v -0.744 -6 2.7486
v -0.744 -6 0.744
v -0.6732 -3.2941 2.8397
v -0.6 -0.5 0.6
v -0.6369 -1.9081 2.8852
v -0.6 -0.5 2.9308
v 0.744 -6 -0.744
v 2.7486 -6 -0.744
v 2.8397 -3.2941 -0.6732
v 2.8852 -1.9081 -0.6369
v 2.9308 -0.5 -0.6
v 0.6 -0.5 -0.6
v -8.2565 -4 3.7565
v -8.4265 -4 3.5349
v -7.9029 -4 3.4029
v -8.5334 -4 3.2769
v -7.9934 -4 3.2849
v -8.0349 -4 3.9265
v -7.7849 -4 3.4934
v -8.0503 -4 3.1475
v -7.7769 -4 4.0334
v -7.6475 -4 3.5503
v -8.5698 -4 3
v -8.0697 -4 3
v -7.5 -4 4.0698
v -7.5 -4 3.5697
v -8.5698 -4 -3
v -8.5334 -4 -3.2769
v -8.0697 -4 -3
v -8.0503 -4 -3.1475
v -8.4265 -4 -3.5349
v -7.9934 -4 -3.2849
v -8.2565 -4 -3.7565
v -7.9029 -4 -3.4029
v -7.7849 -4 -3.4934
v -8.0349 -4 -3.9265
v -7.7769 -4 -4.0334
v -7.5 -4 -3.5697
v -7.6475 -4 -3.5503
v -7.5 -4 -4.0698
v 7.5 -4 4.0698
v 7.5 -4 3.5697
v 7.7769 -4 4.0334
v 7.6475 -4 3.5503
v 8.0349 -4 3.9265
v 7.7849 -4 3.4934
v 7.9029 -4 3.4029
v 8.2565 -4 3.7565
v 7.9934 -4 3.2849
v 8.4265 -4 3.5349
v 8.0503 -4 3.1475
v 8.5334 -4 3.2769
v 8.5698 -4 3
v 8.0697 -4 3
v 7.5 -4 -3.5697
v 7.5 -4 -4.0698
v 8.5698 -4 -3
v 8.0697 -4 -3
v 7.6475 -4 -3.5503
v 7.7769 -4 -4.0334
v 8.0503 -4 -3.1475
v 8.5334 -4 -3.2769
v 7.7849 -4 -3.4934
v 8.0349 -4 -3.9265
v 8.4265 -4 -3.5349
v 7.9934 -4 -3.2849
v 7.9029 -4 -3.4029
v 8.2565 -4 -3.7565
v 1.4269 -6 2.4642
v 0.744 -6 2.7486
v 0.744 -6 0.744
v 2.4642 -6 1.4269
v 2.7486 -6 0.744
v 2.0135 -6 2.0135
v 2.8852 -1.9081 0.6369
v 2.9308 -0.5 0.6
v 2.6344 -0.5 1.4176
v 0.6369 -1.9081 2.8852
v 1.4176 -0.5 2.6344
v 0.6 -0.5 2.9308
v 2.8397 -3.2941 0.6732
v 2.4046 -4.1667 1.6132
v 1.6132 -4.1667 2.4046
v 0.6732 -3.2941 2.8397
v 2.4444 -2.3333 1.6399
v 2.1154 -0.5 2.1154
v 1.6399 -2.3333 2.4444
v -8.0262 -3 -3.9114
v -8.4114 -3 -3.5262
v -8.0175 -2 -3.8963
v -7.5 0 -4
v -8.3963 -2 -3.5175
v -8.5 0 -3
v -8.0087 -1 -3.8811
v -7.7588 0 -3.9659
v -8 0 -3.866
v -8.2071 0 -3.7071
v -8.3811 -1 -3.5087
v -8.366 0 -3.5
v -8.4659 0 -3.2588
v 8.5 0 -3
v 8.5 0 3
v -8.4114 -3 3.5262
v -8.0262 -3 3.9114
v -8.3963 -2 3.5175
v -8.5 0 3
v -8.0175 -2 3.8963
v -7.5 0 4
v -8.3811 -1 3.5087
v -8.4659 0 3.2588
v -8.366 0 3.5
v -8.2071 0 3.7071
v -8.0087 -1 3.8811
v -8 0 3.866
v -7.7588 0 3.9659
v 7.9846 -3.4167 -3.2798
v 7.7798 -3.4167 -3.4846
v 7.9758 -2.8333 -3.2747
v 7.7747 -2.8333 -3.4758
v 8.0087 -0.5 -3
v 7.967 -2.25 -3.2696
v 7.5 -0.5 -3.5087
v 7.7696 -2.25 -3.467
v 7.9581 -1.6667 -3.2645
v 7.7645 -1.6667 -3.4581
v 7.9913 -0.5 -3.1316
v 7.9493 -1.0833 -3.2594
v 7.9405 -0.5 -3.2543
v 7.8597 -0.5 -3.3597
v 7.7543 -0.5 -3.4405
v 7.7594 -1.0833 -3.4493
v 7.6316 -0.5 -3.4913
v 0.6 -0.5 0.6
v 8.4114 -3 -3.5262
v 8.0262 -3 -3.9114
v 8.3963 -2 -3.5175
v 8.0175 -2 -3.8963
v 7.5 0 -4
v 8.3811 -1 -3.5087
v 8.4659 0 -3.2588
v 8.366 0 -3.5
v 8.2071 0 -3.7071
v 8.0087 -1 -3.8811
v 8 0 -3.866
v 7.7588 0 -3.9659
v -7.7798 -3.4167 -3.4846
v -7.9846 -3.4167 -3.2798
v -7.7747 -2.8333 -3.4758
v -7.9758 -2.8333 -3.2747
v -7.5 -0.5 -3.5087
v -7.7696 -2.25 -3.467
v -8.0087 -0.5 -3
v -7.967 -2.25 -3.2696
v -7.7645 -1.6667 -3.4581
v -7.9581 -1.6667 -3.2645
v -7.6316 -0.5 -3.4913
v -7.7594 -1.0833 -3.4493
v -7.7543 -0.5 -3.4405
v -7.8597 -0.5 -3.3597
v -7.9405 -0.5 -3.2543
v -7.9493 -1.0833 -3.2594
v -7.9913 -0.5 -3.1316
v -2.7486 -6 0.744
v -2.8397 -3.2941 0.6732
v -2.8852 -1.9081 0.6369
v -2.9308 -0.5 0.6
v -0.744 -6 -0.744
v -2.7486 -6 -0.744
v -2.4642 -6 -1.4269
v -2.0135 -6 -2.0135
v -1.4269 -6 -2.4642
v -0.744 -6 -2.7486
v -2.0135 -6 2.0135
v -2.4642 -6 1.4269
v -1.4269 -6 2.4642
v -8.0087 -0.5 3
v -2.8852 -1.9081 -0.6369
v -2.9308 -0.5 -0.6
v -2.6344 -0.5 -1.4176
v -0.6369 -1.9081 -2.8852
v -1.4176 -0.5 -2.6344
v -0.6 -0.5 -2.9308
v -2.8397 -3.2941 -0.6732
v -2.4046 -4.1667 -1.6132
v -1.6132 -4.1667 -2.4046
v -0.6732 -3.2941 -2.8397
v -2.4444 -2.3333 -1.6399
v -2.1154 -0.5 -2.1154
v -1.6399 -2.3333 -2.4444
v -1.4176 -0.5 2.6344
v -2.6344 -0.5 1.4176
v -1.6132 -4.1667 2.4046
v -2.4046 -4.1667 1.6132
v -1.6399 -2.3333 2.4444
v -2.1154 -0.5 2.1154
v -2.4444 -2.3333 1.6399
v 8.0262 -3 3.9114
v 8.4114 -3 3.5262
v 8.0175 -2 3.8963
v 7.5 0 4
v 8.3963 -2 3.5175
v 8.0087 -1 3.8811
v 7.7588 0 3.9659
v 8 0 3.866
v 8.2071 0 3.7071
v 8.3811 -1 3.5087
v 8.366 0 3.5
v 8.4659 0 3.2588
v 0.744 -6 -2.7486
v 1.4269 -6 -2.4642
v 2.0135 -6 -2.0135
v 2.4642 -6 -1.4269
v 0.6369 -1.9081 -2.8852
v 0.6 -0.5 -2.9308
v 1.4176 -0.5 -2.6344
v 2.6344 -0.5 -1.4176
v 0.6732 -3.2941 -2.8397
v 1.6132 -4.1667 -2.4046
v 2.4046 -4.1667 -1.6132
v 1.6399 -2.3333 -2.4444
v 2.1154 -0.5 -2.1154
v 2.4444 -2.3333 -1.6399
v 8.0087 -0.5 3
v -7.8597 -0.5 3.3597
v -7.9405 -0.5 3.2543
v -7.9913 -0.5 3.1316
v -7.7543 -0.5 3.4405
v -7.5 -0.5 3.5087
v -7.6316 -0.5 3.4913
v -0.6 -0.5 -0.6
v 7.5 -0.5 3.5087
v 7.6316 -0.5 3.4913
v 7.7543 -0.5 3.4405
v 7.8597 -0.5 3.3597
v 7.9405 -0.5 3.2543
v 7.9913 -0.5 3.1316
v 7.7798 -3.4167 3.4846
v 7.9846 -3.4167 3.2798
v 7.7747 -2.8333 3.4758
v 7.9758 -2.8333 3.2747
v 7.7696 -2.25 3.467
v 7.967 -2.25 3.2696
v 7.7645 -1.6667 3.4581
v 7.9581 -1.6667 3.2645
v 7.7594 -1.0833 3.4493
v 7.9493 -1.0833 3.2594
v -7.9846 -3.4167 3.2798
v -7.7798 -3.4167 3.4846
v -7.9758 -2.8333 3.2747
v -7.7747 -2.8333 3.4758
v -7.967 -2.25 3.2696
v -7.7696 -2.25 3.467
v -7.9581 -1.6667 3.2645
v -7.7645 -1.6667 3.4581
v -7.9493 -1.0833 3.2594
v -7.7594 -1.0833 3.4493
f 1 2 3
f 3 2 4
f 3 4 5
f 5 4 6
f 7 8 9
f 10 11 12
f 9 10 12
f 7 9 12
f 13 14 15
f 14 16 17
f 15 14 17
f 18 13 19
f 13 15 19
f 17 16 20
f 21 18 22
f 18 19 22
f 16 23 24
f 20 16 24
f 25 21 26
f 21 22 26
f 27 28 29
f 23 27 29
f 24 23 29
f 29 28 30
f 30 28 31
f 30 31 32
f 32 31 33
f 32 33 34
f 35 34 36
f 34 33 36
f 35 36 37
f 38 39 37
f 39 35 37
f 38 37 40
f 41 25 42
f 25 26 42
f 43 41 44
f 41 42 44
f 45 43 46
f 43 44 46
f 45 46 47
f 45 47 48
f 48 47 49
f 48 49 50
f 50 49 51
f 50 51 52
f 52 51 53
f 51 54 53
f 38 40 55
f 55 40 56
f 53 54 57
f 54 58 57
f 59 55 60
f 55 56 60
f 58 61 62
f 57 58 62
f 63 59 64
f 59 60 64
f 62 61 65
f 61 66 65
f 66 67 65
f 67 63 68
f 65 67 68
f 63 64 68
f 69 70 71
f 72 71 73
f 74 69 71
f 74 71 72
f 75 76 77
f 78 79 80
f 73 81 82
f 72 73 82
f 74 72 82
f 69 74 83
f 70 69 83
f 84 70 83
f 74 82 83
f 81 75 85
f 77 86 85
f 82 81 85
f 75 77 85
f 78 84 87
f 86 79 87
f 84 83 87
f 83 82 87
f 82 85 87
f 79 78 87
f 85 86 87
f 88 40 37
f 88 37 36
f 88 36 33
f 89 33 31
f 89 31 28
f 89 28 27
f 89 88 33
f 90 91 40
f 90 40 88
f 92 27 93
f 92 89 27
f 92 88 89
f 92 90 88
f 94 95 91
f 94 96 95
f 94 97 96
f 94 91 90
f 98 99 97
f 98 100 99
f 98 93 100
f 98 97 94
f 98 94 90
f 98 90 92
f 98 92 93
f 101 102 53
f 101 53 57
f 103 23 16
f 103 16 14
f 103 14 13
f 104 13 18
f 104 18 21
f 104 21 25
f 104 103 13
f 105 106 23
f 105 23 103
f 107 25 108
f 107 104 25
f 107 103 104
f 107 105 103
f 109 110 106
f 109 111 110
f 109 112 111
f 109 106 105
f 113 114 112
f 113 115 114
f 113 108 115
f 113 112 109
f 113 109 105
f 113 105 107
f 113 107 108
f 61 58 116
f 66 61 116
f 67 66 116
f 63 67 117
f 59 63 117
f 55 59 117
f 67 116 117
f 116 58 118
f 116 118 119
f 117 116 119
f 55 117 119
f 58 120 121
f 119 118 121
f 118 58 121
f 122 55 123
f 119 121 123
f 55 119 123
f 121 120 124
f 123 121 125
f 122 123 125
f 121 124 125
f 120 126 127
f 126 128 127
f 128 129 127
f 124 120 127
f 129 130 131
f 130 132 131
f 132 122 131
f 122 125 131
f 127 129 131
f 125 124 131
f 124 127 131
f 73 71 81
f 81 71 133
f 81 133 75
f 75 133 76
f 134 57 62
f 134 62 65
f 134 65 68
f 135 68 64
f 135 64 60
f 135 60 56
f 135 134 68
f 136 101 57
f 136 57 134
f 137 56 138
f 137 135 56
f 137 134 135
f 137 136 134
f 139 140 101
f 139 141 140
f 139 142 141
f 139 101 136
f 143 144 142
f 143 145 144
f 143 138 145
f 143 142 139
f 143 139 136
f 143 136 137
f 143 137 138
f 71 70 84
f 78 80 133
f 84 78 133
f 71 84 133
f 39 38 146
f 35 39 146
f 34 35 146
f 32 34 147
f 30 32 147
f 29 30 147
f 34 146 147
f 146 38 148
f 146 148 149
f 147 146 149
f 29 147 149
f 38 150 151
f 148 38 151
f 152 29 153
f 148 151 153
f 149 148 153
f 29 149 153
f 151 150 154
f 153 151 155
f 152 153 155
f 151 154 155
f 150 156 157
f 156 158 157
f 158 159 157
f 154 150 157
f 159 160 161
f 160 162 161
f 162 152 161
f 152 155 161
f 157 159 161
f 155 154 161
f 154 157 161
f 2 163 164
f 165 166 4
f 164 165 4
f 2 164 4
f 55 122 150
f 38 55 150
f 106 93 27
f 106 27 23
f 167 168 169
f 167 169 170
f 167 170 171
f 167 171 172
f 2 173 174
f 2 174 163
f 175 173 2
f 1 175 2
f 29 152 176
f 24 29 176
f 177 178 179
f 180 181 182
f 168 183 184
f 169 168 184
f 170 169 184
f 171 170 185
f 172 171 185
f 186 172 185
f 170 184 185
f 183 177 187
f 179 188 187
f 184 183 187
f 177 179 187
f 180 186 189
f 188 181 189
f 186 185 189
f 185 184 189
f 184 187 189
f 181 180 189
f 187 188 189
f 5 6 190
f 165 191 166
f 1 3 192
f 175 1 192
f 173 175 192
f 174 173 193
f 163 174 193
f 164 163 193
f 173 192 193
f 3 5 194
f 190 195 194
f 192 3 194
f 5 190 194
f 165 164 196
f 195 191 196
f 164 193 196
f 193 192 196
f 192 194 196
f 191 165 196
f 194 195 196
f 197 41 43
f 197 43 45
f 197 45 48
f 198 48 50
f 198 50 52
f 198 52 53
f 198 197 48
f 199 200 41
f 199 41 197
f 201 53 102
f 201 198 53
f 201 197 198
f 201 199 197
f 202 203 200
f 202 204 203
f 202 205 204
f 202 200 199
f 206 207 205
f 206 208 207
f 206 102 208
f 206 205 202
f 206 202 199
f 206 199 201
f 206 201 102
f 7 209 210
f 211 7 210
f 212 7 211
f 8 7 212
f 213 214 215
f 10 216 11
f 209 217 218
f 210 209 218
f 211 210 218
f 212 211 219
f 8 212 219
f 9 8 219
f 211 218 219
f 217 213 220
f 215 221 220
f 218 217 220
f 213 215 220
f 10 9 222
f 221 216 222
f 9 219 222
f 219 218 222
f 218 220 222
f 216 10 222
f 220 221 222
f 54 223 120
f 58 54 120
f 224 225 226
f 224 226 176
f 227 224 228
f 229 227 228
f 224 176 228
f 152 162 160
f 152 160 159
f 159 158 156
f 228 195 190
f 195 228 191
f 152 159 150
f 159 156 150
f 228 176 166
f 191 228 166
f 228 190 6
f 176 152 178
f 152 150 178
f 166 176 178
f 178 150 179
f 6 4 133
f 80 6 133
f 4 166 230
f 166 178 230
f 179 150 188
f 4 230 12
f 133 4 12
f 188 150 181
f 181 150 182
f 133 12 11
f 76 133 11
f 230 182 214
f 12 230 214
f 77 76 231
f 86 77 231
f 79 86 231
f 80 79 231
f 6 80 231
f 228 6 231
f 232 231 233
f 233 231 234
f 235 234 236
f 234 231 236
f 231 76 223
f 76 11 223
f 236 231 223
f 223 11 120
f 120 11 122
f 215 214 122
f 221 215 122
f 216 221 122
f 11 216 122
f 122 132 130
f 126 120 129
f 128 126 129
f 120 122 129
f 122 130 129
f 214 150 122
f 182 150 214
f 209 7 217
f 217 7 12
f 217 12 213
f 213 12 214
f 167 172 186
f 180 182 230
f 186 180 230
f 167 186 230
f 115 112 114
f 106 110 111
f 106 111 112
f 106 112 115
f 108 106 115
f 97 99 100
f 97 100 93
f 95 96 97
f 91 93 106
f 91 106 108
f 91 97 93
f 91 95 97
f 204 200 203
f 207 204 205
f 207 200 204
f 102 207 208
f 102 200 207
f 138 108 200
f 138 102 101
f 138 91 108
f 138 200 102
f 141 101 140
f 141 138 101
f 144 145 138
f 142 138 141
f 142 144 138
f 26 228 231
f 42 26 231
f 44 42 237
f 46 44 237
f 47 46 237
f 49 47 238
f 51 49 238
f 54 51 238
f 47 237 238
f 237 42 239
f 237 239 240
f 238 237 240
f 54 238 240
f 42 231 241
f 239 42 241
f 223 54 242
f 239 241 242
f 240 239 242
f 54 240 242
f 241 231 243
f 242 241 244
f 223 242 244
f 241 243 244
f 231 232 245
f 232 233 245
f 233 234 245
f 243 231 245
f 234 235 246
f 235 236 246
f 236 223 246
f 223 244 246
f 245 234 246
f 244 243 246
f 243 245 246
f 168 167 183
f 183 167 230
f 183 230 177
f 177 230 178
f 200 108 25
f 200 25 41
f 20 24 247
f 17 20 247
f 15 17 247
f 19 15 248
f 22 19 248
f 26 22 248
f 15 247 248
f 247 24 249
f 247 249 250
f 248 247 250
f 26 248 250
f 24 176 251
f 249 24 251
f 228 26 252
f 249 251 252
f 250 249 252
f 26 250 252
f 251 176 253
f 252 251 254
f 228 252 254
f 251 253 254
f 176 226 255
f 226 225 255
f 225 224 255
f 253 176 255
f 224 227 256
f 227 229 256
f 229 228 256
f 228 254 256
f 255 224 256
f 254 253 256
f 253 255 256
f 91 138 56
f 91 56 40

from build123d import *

# Parameters (mm, degrees)
BOSS_EXTRUDE1_DEPTH           = 4
BOSS_EXTRUDE1_DRAFT           = 1
SHELL1_T                      = -0.5
BOSS_EXTRUDE2_DEPTH           = 5.5
BOSS_EXTRUDE2_DRAFT           = 1.5
BOSS_EXTRUDE2_PROFILE_2_DEPTH = 5.5
BOSS_EXTRUDE2_PROFILE_2_DRAFT = 1.5
BOSS_EXTRUDE2_PROFILE_3_DEPTH = 5.5
BOSS_EXTRUDE2_PROFILE_3_DRAFT = 1.5
BOSS_EXTRUDE2_PROFILE_4_DEPTH = 5.5
BOSS_EXTRUDE2_PROFILE_4_DRAFT = 1.5


with BuildPart() as part:
    # Sketch1 → Boss-Extrude1 (with draft: the straight prism first)
    with BuildSketch(Plane(origin=(0, 0, 0), x_dir=(1, 0, 0), z_dir=(0, 1, 0))):
        with BuildLine():
            Line((-7.5, -4), (7.5, -4))
            ThreePointArc((7.5, -4), (8.207106781, -3.707106781), (8.5, -3))
            Line((8.5, -3), (8.5, 3))
            ThreePointArc((8.5, 3), (8.207106781, 3.707106781), (7.5, 4))
            Line((7.5, 4), (-7.5, 4))
            ThreePointArc((-7.5, 4), (-8.207106781, 3.707106781), (-8.5, 3))
            Line((-8.5, 3), (-8.5, -3))
            ThreePointArc((-8.5, -3), (-8.207106781, -3.707106781), (-7.5, -4))
        make_face()
    extrude(amount=-BOSS_EXTRUDE1_DEPTH)
    # Boss-Extrude1: the draft: its side faces are tilted about the plane it starts from
    boss_extrude1_sides = [part.faces().sort_by_distance(p)[0] for p in [
        (0, -2, 4),
        (8.207106781, -2, 3.707106781),
        (8.5, -2, 0),
        (8.207106781, -2, -3.707106781),
        (0, -2, -4),
        (-8.207106781, -2, -3.707106781),
        (-8.5, -2, 0),
        (-8.207106781, -2, 3.707106781),
    ]]
    draft(boss_extrude1_sides, Plane(origin=(0, 0, 0), x_dir=(1, 0, 0), z_dir=(0, 1, 0)), BOSS_EXTRUDE1_DRAFT)

    # Shell1
    shell1_openings = [part.faces().sort_by_distance(p)[0] for p in [
        (0, -4, 0),
    ]]
    offset(amount=SHELL1_T, openings=shell1_openings, kind=Kind.INTERSECTION)


with BuildPart() as boss_extrude2_tool:
    # Sketch2 → Boss-Extrude2 (with draft: the straight prism first)
    with BuildSketch(Plane.XZ.offset(0.5)):
        with BuildLine():
            ThreePointArc((-0.6, 2.93078798), (-2.115362638, 2.115362638), (-2.93078798, 0.6))
            Line((-2.93078798, 0.6), (-0.6, 0.6))
            Line((-0.6, 0.6), (-0.6, 2.93078798))
        make_face()
    extrude(amount=BOSS_EXTRUDE2_DEPTH)
    # Boss-Extrude2: the draft: its side faces are tilted about the plane it starts from
    boss_extrude2_sides = [boss_extrude2_tool.faces().sort_by_distance(p)[0] for p in [
        (-2.115362638, -3.25, 2.115362638),
        (-1.76539399, -3.25, 0.6),
        (-0.6, -3.25, 1.76539399),
    ]]
    draft(boss_extrude2_sides, Plane.XZ.offset(0.5), BOSS_EXTRUDE2_DRAFT)


with BuildPart() as part_1:
    add(part.part)

    # Boss-Extrude2: add boss_extrude2_tool
    add(boss_extrude2_tool.part)


with BuildPart() as boss_extrude2_profile_2_tool:
    # Sketch2 → Boss-Extrude2 profile 2 (with draft: the straight prism first)
    with BuildSketch(Plane.XZ.offset(0.5)):
        with BuildLine():
            ThreePointArc((-2.93078798, -0.6), (-2.115362638, -2.115362638), (-0.6, -2.93078798))
            Line((-0.6, -2.93078798), (-0.6, -0.6))
            Line((-0.6, -0.6), (-2.93078798, -0.6))
        make_face()
    extrude(amount=BOSS_EXTRUDE2_PROFILE_2_DEPTH)
    # Boss-Extrude2 profile 2: the draft: its side faces are tilted about the plane it starts from
    boss_extrude2_profile_2_sides = [boss_extrude2_profile_2_tool.faces().sort_by_distance(p)[0] for p in [
        (-2.115362638, -3.25, -2.115362638),
        (-0.6, -3.25, -1.76539399),
        (-1.76539399, -3.25, -0.6),
    ]]
    draft(boss_extrude2_profile_2_sides, Plane.XZ.offset(0.5), BOSS_EXTRUDE2_PROFILE_2_DRAFT)


with BuildPart() as part_2:
    add(part_1.part)

    # Boss-Extrude2 profile 2: add boss_extrude2_profile_2_tool
    add(boss_extrude2_profile_2_tool.part)


with BuildPart() as boss_extrude2_profile_3_tool:
    # Sketch2 → Boss-Extrude2 profile 3 (with draft: the straight prism first)
    with BuildSketch(Plane.XZ.offset(0.5)):
        with BuildLine():
            Line((0.6, 2.93078798), (0.6, 0.6))
            Line((0.6, 0.6), (2.93078798, 0.6))
            ThreePointArc((2.93078798, 0.6), (2.115362638, 2.115362638), (0.6, 2.93078798))
        make_face()
    extrude(amount=BOSS_EXTRUDE2_PROFILE_3_DEPTH)
    # Boss-Extrude2 profile 3: the draft: its side faces are tilted about the plane it starts from
    boss_extrude2_profile_3_sides = [boss_extrude2_profile_3_tool.faces().sort_by_distance(p)[0] for p in [
        (2.115362638, -3.25, 2.115362638),
        (0.6, -3.25, 1.76539399),
        (1.76539399, -3.25, 0.6),
    ]]
    draft(boss_extrude2_profile_3_sides, Plane.XZ.offset(0.5), BOSS_EXTRUDE2_PROFILE_3_DRAFT)


with BuildPart() as part_3:
    add(part_2.part)

    # Boss-Extrude2 profile 3: add boss_extrude2_profile_3_tool
    add(boss_extrude2_profile_3_tool.part)


with BuildPart() as boss_extrude2_profile_4_tool:
    # Sketch2 → Boss-Extrude2 profile 4 (with draft: the straight prism first)
    with BuildSketch(Plane.XZ.offset(0.5)):
        with BuildLine():
            Line((0.6, -0.6), (0.6, -2.93078798))
            ThreePointArc((0.6, -2.93078798), (2.115362638, -2.115362638), (2.93078798, -0.6))
            Line((2.93078798, -0.6), (0.6, -0.6))
        make_face()
    extrude(amount=BOSS_EXTRUDE2_PROFILE_4_DEPTH)
    # Boss-Extrude2 profile 4: the draft: its side faces are tilted about the plane it starts from
    boss_extrude2_profile_4_sides = [boss_extrude2_profile_4_tool.faces().sort_by_distance(p)[0] for p in [
        (1.76539399, -3.25, -0.6),
        (0.6, -3.25, -1.76539399),
        (2.115362638, -3.25, -2.115362638),
    ]]
    draft(boss_extrude2_profile_4_sides, Plane.XZ.offset(0.5), BOSS_EXTRUDE2_PROFILE_4_DRAFT)


with BuildPart() as part_4:
    add(part_3.part)

    # Boss-Extrude2 profile 4: add boss_extrude2_profile_4_tool
    add(boss_extrude2_profile_4_tool.part)


solid = part_4.part
